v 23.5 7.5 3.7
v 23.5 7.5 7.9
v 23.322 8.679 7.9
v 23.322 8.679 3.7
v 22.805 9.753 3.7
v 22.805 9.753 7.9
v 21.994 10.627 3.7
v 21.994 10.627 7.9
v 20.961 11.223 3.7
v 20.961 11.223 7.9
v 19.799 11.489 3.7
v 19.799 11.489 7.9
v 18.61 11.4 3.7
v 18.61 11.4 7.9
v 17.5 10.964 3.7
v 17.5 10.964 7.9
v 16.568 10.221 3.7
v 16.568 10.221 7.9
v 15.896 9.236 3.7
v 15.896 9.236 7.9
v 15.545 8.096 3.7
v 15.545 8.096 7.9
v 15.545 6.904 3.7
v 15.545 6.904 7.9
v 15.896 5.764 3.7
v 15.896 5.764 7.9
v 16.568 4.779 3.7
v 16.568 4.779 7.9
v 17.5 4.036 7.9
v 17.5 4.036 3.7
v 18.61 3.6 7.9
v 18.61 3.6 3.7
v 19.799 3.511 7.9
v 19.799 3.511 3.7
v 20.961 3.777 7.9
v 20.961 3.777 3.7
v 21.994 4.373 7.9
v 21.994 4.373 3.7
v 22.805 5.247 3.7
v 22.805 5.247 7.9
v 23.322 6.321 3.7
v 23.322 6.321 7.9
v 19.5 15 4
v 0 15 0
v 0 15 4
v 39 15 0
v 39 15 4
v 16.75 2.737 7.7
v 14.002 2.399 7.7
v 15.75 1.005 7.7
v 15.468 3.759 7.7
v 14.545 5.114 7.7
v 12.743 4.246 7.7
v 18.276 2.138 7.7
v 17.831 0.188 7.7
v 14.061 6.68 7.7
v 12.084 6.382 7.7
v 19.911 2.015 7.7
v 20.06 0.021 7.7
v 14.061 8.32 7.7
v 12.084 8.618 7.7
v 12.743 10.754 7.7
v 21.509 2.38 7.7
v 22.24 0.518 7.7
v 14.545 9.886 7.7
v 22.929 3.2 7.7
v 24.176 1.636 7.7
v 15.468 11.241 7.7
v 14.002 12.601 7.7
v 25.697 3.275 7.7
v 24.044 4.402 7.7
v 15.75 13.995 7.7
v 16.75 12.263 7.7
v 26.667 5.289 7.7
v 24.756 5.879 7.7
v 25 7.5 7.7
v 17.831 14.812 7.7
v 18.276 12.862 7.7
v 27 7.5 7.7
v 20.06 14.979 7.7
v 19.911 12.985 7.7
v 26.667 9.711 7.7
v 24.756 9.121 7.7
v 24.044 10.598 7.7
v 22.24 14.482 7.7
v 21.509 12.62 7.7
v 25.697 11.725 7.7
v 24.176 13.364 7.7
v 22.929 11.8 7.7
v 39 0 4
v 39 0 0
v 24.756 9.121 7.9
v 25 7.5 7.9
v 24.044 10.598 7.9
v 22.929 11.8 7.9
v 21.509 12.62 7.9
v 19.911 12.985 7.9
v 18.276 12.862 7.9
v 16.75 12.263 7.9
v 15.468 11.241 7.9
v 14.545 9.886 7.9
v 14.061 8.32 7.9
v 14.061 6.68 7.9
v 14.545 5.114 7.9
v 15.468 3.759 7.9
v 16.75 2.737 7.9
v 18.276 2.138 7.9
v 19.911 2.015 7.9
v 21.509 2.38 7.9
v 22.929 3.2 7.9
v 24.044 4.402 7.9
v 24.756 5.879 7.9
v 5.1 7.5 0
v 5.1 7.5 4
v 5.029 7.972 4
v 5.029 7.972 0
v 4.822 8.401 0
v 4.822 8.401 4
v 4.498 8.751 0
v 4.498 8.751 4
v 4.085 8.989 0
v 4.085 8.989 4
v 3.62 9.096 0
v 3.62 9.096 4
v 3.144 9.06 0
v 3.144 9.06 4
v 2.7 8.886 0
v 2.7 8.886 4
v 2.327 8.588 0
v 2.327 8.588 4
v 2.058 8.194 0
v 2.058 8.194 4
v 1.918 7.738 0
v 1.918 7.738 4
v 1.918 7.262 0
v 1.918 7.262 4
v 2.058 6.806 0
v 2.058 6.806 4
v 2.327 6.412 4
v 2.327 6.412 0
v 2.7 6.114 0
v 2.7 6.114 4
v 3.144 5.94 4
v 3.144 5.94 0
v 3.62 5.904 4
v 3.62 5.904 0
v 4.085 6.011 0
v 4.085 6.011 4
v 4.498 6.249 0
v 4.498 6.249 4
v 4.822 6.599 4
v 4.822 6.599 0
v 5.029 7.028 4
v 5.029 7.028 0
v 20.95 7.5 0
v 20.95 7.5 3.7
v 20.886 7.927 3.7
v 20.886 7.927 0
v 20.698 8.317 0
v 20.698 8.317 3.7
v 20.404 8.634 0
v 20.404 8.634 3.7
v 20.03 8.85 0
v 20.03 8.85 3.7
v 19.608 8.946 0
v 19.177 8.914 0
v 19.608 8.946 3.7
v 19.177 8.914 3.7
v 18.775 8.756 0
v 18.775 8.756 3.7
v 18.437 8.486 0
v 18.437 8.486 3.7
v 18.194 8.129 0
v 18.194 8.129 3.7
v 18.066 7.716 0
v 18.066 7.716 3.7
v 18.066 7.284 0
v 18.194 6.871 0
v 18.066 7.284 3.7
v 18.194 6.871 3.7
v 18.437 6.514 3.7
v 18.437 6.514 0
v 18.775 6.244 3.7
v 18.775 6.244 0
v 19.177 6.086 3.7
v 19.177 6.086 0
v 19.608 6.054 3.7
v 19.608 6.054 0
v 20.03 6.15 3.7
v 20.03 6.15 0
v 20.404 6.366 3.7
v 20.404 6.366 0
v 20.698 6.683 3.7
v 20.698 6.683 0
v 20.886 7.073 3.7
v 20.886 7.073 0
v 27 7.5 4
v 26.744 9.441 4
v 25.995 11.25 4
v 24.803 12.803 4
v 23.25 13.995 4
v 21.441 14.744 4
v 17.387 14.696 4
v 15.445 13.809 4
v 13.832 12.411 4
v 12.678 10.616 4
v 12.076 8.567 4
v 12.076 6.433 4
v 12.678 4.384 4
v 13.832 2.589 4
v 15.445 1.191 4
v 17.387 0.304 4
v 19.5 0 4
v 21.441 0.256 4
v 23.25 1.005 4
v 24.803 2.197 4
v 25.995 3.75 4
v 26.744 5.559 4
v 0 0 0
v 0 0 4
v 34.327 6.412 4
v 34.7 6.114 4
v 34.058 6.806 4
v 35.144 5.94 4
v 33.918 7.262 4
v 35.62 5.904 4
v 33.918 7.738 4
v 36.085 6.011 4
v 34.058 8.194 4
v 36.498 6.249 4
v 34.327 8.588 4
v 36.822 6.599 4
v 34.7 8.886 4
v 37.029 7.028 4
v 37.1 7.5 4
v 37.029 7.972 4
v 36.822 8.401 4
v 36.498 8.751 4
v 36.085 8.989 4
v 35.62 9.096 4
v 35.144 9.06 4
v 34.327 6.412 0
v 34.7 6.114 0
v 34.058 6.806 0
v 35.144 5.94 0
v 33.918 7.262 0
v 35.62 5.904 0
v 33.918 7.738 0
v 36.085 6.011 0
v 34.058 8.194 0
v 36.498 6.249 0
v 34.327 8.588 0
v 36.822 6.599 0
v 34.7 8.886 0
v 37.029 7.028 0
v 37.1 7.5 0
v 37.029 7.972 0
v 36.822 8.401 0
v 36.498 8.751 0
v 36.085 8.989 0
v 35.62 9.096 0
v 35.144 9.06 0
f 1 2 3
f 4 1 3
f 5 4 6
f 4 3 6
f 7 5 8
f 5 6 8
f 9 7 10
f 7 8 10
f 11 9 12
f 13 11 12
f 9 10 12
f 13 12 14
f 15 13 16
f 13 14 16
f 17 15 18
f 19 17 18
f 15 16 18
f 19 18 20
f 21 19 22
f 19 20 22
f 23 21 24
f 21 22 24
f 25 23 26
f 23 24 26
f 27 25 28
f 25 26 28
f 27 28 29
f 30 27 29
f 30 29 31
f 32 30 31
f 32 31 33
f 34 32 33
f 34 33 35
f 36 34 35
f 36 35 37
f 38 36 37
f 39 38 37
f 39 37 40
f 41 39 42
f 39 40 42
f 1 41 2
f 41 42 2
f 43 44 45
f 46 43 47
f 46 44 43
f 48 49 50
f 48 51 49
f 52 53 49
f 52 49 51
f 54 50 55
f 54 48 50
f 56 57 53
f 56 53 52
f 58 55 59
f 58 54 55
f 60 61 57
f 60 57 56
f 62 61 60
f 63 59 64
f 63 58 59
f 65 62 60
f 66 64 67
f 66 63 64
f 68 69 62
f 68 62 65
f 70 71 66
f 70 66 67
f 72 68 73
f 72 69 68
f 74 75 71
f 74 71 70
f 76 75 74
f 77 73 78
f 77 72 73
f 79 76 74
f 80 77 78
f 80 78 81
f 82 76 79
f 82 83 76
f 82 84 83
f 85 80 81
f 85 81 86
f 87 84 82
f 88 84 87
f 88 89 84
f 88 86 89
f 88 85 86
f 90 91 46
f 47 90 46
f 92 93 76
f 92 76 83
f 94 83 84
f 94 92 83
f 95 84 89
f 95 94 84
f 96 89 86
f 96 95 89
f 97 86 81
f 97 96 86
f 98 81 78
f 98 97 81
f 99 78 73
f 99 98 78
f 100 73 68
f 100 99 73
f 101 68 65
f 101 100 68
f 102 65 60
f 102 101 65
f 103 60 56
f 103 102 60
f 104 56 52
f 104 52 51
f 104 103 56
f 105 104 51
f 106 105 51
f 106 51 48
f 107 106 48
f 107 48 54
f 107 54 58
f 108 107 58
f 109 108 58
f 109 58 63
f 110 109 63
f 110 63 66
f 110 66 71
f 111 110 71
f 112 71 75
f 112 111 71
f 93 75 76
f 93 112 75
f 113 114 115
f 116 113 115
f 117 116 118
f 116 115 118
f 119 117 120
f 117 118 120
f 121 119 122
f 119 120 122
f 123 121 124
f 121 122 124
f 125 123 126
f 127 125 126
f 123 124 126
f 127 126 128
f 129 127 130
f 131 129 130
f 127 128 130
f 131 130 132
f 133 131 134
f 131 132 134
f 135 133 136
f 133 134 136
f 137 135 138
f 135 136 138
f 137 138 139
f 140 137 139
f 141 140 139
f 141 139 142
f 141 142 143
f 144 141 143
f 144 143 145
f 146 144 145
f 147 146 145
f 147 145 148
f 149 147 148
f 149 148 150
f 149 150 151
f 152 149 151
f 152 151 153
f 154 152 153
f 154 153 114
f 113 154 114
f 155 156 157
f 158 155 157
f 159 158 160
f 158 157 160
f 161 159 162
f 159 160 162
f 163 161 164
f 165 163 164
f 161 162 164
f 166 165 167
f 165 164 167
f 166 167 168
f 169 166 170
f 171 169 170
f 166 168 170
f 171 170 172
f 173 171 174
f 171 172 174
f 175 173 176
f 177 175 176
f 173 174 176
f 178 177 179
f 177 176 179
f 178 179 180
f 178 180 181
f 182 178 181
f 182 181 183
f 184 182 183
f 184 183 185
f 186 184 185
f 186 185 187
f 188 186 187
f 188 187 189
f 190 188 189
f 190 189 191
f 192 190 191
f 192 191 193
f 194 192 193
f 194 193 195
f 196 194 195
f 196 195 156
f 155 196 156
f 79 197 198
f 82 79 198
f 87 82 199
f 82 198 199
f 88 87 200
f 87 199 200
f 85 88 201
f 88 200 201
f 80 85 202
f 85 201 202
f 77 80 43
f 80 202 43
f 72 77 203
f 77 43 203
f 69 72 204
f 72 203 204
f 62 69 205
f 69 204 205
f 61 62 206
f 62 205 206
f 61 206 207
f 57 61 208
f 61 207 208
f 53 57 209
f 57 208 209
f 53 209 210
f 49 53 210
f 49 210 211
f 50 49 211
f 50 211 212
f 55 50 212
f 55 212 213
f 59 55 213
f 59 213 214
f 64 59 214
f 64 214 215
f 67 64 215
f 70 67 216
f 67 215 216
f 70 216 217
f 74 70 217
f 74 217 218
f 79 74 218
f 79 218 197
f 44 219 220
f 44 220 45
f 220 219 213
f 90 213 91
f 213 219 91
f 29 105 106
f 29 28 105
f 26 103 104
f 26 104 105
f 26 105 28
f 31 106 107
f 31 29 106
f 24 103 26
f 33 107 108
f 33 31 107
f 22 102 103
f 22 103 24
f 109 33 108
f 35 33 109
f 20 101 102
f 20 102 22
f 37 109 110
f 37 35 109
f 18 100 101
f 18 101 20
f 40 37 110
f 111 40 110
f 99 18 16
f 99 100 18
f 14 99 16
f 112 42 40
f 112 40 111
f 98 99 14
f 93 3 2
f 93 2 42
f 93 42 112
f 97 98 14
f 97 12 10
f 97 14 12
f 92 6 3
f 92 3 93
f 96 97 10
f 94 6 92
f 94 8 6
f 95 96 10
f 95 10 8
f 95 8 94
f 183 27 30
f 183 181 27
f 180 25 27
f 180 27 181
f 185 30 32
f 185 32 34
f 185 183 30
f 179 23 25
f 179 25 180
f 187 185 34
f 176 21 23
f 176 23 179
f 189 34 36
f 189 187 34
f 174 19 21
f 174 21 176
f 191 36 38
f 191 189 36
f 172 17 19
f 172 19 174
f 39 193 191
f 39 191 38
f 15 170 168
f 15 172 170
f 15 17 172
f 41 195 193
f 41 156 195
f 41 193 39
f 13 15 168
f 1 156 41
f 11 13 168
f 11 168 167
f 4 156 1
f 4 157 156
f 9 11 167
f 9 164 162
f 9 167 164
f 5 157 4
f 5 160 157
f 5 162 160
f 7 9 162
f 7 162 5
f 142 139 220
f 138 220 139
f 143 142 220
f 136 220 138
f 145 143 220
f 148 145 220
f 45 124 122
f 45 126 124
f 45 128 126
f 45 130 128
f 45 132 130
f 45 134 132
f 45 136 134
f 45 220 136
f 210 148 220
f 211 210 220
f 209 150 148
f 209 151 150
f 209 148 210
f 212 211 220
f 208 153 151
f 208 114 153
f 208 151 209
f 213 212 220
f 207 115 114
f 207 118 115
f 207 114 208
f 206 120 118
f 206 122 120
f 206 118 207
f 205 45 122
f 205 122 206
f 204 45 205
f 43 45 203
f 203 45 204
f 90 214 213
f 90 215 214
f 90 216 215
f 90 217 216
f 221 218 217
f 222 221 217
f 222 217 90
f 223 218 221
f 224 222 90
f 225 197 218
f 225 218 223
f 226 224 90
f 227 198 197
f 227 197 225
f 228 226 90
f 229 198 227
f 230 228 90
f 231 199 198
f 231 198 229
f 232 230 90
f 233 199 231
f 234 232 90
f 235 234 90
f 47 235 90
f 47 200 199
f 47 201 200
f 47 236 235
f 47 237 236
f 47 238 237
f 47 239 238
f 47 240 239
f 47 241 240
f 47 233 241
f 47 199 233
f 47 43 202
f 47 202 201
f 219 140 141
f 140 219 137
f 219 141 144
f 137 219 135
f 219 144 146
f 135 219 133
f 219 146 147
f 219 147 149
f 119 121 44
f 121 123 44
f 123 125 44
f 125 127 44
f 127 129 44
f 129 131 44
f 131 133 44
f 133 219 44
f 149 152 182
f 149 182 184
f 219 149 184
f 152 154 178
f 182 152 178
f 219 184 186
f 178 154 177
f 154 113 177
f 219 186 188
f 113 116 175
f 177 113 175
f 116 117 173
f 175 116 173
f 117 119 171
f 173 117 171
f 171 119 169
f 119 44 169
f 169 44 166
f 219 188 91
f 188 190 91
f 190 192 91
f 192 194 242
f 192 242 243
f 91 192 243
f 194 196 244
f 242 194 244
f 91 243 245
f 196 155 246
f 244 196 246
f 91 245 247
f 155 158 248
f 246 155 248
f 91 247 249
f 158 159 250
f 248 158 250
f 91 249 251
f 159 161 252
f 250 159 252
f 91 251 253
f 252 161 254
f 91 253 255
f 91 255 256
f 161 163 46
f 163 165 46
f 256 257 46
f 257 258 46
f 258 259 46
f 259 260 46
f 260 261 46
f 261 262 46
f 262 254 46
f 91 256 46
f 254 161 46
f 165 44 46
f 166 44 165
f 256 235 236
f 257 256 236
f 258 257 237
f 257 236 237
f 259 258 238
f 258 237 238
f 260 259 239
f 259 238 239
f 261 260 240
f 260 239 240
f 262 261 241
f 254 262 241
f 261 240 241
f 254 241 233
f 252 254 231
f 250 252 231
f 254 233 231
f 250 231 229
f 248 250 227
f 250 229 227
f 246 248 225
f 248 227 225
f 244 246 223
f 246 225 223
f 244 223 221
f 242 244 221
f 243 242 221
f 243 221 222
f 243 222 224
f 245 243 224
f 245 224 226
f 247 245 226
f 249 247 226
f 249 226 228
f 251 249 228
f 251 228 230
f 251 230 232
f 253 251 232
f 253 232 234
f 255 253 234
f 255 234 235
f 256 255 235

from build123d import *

# Parameters (mm, degrees)
F0_W      = 39
F0_H      = 15
F1_DEPTH  = 4
F2_R      = 7.5
F3_DEPTH  = 3.9
F4_R      = 4
F5_DEPTH  = 4.2
F6_R      = 1.6
F7_DEPTH  = 25
F8_R      = 1.45
F9_DEPTH  = 25
F10_R     = 7.5
F10_R_2   = 5.5
F11_DEPTH = 0.2


# Not quite as in the source:
# - a feature names something its author has since deleted; it is built from what else it names


with BuildPart() as f1:
    # F0 (on Top) → F1 (new body)
    with BuildSketch(Plane.XY):
        with Locations((19.5, 7.5)):
            Rectangle(F0_W, F0_H)
    extrude(amount=F1_DEPTH)

    # F2 (on face) → F3 (join)
    with BuildSketch(Plane.XY.offset(4)):
        with Locations((19.5, 7.5)):
            Circle(F2_R)
    extrude(amount=F3_DEPTH)

    # F4 (on face) → F5 (cut)
    with BuildSketch(Plane.XY.offset(7.9)):
        with Locations((19.5, 7.5)):
            Circle(F4_R)
    extrude(amount=-F5_DEPTH, mode=Mode.SUBTRACT)

    # F6 (on face) → F7 (cut)
    with BuildSketch(Plane.XY.offset(4)):
        with Locations((35.5, 7.5)):
            Circle(F6_R)
        with Locations((3.5, 7.5)):
            Circle(F6_R)
    extrude(amount=-F7_DEPTH, mode=Mode.SUBTRACT)

    # F8 (on face) → F9 (cut)
    with BuildSketch(Plane.XY.offset(3.7)):
        with Locations((19.5, 7.5)):
            Circle(F8_R)
    extrude(amount=-F9_DEPTH, mode=Mode.SUBTRACT)

    # F10 (on face) → F11 (cut)
    with BuildSketch(Plane.XY.offset(7.9)):
        with Locations((19.5, 7.5)):
            Circle(F10_R)
        with Locations((19.5, 7.5)):
            Circle(F10_R_2, mode=Mode.SUBTRACT)
    extrude(amount=-F11_DEPTH, mode=Mode.SUBTRACT)


solid = f1.part
